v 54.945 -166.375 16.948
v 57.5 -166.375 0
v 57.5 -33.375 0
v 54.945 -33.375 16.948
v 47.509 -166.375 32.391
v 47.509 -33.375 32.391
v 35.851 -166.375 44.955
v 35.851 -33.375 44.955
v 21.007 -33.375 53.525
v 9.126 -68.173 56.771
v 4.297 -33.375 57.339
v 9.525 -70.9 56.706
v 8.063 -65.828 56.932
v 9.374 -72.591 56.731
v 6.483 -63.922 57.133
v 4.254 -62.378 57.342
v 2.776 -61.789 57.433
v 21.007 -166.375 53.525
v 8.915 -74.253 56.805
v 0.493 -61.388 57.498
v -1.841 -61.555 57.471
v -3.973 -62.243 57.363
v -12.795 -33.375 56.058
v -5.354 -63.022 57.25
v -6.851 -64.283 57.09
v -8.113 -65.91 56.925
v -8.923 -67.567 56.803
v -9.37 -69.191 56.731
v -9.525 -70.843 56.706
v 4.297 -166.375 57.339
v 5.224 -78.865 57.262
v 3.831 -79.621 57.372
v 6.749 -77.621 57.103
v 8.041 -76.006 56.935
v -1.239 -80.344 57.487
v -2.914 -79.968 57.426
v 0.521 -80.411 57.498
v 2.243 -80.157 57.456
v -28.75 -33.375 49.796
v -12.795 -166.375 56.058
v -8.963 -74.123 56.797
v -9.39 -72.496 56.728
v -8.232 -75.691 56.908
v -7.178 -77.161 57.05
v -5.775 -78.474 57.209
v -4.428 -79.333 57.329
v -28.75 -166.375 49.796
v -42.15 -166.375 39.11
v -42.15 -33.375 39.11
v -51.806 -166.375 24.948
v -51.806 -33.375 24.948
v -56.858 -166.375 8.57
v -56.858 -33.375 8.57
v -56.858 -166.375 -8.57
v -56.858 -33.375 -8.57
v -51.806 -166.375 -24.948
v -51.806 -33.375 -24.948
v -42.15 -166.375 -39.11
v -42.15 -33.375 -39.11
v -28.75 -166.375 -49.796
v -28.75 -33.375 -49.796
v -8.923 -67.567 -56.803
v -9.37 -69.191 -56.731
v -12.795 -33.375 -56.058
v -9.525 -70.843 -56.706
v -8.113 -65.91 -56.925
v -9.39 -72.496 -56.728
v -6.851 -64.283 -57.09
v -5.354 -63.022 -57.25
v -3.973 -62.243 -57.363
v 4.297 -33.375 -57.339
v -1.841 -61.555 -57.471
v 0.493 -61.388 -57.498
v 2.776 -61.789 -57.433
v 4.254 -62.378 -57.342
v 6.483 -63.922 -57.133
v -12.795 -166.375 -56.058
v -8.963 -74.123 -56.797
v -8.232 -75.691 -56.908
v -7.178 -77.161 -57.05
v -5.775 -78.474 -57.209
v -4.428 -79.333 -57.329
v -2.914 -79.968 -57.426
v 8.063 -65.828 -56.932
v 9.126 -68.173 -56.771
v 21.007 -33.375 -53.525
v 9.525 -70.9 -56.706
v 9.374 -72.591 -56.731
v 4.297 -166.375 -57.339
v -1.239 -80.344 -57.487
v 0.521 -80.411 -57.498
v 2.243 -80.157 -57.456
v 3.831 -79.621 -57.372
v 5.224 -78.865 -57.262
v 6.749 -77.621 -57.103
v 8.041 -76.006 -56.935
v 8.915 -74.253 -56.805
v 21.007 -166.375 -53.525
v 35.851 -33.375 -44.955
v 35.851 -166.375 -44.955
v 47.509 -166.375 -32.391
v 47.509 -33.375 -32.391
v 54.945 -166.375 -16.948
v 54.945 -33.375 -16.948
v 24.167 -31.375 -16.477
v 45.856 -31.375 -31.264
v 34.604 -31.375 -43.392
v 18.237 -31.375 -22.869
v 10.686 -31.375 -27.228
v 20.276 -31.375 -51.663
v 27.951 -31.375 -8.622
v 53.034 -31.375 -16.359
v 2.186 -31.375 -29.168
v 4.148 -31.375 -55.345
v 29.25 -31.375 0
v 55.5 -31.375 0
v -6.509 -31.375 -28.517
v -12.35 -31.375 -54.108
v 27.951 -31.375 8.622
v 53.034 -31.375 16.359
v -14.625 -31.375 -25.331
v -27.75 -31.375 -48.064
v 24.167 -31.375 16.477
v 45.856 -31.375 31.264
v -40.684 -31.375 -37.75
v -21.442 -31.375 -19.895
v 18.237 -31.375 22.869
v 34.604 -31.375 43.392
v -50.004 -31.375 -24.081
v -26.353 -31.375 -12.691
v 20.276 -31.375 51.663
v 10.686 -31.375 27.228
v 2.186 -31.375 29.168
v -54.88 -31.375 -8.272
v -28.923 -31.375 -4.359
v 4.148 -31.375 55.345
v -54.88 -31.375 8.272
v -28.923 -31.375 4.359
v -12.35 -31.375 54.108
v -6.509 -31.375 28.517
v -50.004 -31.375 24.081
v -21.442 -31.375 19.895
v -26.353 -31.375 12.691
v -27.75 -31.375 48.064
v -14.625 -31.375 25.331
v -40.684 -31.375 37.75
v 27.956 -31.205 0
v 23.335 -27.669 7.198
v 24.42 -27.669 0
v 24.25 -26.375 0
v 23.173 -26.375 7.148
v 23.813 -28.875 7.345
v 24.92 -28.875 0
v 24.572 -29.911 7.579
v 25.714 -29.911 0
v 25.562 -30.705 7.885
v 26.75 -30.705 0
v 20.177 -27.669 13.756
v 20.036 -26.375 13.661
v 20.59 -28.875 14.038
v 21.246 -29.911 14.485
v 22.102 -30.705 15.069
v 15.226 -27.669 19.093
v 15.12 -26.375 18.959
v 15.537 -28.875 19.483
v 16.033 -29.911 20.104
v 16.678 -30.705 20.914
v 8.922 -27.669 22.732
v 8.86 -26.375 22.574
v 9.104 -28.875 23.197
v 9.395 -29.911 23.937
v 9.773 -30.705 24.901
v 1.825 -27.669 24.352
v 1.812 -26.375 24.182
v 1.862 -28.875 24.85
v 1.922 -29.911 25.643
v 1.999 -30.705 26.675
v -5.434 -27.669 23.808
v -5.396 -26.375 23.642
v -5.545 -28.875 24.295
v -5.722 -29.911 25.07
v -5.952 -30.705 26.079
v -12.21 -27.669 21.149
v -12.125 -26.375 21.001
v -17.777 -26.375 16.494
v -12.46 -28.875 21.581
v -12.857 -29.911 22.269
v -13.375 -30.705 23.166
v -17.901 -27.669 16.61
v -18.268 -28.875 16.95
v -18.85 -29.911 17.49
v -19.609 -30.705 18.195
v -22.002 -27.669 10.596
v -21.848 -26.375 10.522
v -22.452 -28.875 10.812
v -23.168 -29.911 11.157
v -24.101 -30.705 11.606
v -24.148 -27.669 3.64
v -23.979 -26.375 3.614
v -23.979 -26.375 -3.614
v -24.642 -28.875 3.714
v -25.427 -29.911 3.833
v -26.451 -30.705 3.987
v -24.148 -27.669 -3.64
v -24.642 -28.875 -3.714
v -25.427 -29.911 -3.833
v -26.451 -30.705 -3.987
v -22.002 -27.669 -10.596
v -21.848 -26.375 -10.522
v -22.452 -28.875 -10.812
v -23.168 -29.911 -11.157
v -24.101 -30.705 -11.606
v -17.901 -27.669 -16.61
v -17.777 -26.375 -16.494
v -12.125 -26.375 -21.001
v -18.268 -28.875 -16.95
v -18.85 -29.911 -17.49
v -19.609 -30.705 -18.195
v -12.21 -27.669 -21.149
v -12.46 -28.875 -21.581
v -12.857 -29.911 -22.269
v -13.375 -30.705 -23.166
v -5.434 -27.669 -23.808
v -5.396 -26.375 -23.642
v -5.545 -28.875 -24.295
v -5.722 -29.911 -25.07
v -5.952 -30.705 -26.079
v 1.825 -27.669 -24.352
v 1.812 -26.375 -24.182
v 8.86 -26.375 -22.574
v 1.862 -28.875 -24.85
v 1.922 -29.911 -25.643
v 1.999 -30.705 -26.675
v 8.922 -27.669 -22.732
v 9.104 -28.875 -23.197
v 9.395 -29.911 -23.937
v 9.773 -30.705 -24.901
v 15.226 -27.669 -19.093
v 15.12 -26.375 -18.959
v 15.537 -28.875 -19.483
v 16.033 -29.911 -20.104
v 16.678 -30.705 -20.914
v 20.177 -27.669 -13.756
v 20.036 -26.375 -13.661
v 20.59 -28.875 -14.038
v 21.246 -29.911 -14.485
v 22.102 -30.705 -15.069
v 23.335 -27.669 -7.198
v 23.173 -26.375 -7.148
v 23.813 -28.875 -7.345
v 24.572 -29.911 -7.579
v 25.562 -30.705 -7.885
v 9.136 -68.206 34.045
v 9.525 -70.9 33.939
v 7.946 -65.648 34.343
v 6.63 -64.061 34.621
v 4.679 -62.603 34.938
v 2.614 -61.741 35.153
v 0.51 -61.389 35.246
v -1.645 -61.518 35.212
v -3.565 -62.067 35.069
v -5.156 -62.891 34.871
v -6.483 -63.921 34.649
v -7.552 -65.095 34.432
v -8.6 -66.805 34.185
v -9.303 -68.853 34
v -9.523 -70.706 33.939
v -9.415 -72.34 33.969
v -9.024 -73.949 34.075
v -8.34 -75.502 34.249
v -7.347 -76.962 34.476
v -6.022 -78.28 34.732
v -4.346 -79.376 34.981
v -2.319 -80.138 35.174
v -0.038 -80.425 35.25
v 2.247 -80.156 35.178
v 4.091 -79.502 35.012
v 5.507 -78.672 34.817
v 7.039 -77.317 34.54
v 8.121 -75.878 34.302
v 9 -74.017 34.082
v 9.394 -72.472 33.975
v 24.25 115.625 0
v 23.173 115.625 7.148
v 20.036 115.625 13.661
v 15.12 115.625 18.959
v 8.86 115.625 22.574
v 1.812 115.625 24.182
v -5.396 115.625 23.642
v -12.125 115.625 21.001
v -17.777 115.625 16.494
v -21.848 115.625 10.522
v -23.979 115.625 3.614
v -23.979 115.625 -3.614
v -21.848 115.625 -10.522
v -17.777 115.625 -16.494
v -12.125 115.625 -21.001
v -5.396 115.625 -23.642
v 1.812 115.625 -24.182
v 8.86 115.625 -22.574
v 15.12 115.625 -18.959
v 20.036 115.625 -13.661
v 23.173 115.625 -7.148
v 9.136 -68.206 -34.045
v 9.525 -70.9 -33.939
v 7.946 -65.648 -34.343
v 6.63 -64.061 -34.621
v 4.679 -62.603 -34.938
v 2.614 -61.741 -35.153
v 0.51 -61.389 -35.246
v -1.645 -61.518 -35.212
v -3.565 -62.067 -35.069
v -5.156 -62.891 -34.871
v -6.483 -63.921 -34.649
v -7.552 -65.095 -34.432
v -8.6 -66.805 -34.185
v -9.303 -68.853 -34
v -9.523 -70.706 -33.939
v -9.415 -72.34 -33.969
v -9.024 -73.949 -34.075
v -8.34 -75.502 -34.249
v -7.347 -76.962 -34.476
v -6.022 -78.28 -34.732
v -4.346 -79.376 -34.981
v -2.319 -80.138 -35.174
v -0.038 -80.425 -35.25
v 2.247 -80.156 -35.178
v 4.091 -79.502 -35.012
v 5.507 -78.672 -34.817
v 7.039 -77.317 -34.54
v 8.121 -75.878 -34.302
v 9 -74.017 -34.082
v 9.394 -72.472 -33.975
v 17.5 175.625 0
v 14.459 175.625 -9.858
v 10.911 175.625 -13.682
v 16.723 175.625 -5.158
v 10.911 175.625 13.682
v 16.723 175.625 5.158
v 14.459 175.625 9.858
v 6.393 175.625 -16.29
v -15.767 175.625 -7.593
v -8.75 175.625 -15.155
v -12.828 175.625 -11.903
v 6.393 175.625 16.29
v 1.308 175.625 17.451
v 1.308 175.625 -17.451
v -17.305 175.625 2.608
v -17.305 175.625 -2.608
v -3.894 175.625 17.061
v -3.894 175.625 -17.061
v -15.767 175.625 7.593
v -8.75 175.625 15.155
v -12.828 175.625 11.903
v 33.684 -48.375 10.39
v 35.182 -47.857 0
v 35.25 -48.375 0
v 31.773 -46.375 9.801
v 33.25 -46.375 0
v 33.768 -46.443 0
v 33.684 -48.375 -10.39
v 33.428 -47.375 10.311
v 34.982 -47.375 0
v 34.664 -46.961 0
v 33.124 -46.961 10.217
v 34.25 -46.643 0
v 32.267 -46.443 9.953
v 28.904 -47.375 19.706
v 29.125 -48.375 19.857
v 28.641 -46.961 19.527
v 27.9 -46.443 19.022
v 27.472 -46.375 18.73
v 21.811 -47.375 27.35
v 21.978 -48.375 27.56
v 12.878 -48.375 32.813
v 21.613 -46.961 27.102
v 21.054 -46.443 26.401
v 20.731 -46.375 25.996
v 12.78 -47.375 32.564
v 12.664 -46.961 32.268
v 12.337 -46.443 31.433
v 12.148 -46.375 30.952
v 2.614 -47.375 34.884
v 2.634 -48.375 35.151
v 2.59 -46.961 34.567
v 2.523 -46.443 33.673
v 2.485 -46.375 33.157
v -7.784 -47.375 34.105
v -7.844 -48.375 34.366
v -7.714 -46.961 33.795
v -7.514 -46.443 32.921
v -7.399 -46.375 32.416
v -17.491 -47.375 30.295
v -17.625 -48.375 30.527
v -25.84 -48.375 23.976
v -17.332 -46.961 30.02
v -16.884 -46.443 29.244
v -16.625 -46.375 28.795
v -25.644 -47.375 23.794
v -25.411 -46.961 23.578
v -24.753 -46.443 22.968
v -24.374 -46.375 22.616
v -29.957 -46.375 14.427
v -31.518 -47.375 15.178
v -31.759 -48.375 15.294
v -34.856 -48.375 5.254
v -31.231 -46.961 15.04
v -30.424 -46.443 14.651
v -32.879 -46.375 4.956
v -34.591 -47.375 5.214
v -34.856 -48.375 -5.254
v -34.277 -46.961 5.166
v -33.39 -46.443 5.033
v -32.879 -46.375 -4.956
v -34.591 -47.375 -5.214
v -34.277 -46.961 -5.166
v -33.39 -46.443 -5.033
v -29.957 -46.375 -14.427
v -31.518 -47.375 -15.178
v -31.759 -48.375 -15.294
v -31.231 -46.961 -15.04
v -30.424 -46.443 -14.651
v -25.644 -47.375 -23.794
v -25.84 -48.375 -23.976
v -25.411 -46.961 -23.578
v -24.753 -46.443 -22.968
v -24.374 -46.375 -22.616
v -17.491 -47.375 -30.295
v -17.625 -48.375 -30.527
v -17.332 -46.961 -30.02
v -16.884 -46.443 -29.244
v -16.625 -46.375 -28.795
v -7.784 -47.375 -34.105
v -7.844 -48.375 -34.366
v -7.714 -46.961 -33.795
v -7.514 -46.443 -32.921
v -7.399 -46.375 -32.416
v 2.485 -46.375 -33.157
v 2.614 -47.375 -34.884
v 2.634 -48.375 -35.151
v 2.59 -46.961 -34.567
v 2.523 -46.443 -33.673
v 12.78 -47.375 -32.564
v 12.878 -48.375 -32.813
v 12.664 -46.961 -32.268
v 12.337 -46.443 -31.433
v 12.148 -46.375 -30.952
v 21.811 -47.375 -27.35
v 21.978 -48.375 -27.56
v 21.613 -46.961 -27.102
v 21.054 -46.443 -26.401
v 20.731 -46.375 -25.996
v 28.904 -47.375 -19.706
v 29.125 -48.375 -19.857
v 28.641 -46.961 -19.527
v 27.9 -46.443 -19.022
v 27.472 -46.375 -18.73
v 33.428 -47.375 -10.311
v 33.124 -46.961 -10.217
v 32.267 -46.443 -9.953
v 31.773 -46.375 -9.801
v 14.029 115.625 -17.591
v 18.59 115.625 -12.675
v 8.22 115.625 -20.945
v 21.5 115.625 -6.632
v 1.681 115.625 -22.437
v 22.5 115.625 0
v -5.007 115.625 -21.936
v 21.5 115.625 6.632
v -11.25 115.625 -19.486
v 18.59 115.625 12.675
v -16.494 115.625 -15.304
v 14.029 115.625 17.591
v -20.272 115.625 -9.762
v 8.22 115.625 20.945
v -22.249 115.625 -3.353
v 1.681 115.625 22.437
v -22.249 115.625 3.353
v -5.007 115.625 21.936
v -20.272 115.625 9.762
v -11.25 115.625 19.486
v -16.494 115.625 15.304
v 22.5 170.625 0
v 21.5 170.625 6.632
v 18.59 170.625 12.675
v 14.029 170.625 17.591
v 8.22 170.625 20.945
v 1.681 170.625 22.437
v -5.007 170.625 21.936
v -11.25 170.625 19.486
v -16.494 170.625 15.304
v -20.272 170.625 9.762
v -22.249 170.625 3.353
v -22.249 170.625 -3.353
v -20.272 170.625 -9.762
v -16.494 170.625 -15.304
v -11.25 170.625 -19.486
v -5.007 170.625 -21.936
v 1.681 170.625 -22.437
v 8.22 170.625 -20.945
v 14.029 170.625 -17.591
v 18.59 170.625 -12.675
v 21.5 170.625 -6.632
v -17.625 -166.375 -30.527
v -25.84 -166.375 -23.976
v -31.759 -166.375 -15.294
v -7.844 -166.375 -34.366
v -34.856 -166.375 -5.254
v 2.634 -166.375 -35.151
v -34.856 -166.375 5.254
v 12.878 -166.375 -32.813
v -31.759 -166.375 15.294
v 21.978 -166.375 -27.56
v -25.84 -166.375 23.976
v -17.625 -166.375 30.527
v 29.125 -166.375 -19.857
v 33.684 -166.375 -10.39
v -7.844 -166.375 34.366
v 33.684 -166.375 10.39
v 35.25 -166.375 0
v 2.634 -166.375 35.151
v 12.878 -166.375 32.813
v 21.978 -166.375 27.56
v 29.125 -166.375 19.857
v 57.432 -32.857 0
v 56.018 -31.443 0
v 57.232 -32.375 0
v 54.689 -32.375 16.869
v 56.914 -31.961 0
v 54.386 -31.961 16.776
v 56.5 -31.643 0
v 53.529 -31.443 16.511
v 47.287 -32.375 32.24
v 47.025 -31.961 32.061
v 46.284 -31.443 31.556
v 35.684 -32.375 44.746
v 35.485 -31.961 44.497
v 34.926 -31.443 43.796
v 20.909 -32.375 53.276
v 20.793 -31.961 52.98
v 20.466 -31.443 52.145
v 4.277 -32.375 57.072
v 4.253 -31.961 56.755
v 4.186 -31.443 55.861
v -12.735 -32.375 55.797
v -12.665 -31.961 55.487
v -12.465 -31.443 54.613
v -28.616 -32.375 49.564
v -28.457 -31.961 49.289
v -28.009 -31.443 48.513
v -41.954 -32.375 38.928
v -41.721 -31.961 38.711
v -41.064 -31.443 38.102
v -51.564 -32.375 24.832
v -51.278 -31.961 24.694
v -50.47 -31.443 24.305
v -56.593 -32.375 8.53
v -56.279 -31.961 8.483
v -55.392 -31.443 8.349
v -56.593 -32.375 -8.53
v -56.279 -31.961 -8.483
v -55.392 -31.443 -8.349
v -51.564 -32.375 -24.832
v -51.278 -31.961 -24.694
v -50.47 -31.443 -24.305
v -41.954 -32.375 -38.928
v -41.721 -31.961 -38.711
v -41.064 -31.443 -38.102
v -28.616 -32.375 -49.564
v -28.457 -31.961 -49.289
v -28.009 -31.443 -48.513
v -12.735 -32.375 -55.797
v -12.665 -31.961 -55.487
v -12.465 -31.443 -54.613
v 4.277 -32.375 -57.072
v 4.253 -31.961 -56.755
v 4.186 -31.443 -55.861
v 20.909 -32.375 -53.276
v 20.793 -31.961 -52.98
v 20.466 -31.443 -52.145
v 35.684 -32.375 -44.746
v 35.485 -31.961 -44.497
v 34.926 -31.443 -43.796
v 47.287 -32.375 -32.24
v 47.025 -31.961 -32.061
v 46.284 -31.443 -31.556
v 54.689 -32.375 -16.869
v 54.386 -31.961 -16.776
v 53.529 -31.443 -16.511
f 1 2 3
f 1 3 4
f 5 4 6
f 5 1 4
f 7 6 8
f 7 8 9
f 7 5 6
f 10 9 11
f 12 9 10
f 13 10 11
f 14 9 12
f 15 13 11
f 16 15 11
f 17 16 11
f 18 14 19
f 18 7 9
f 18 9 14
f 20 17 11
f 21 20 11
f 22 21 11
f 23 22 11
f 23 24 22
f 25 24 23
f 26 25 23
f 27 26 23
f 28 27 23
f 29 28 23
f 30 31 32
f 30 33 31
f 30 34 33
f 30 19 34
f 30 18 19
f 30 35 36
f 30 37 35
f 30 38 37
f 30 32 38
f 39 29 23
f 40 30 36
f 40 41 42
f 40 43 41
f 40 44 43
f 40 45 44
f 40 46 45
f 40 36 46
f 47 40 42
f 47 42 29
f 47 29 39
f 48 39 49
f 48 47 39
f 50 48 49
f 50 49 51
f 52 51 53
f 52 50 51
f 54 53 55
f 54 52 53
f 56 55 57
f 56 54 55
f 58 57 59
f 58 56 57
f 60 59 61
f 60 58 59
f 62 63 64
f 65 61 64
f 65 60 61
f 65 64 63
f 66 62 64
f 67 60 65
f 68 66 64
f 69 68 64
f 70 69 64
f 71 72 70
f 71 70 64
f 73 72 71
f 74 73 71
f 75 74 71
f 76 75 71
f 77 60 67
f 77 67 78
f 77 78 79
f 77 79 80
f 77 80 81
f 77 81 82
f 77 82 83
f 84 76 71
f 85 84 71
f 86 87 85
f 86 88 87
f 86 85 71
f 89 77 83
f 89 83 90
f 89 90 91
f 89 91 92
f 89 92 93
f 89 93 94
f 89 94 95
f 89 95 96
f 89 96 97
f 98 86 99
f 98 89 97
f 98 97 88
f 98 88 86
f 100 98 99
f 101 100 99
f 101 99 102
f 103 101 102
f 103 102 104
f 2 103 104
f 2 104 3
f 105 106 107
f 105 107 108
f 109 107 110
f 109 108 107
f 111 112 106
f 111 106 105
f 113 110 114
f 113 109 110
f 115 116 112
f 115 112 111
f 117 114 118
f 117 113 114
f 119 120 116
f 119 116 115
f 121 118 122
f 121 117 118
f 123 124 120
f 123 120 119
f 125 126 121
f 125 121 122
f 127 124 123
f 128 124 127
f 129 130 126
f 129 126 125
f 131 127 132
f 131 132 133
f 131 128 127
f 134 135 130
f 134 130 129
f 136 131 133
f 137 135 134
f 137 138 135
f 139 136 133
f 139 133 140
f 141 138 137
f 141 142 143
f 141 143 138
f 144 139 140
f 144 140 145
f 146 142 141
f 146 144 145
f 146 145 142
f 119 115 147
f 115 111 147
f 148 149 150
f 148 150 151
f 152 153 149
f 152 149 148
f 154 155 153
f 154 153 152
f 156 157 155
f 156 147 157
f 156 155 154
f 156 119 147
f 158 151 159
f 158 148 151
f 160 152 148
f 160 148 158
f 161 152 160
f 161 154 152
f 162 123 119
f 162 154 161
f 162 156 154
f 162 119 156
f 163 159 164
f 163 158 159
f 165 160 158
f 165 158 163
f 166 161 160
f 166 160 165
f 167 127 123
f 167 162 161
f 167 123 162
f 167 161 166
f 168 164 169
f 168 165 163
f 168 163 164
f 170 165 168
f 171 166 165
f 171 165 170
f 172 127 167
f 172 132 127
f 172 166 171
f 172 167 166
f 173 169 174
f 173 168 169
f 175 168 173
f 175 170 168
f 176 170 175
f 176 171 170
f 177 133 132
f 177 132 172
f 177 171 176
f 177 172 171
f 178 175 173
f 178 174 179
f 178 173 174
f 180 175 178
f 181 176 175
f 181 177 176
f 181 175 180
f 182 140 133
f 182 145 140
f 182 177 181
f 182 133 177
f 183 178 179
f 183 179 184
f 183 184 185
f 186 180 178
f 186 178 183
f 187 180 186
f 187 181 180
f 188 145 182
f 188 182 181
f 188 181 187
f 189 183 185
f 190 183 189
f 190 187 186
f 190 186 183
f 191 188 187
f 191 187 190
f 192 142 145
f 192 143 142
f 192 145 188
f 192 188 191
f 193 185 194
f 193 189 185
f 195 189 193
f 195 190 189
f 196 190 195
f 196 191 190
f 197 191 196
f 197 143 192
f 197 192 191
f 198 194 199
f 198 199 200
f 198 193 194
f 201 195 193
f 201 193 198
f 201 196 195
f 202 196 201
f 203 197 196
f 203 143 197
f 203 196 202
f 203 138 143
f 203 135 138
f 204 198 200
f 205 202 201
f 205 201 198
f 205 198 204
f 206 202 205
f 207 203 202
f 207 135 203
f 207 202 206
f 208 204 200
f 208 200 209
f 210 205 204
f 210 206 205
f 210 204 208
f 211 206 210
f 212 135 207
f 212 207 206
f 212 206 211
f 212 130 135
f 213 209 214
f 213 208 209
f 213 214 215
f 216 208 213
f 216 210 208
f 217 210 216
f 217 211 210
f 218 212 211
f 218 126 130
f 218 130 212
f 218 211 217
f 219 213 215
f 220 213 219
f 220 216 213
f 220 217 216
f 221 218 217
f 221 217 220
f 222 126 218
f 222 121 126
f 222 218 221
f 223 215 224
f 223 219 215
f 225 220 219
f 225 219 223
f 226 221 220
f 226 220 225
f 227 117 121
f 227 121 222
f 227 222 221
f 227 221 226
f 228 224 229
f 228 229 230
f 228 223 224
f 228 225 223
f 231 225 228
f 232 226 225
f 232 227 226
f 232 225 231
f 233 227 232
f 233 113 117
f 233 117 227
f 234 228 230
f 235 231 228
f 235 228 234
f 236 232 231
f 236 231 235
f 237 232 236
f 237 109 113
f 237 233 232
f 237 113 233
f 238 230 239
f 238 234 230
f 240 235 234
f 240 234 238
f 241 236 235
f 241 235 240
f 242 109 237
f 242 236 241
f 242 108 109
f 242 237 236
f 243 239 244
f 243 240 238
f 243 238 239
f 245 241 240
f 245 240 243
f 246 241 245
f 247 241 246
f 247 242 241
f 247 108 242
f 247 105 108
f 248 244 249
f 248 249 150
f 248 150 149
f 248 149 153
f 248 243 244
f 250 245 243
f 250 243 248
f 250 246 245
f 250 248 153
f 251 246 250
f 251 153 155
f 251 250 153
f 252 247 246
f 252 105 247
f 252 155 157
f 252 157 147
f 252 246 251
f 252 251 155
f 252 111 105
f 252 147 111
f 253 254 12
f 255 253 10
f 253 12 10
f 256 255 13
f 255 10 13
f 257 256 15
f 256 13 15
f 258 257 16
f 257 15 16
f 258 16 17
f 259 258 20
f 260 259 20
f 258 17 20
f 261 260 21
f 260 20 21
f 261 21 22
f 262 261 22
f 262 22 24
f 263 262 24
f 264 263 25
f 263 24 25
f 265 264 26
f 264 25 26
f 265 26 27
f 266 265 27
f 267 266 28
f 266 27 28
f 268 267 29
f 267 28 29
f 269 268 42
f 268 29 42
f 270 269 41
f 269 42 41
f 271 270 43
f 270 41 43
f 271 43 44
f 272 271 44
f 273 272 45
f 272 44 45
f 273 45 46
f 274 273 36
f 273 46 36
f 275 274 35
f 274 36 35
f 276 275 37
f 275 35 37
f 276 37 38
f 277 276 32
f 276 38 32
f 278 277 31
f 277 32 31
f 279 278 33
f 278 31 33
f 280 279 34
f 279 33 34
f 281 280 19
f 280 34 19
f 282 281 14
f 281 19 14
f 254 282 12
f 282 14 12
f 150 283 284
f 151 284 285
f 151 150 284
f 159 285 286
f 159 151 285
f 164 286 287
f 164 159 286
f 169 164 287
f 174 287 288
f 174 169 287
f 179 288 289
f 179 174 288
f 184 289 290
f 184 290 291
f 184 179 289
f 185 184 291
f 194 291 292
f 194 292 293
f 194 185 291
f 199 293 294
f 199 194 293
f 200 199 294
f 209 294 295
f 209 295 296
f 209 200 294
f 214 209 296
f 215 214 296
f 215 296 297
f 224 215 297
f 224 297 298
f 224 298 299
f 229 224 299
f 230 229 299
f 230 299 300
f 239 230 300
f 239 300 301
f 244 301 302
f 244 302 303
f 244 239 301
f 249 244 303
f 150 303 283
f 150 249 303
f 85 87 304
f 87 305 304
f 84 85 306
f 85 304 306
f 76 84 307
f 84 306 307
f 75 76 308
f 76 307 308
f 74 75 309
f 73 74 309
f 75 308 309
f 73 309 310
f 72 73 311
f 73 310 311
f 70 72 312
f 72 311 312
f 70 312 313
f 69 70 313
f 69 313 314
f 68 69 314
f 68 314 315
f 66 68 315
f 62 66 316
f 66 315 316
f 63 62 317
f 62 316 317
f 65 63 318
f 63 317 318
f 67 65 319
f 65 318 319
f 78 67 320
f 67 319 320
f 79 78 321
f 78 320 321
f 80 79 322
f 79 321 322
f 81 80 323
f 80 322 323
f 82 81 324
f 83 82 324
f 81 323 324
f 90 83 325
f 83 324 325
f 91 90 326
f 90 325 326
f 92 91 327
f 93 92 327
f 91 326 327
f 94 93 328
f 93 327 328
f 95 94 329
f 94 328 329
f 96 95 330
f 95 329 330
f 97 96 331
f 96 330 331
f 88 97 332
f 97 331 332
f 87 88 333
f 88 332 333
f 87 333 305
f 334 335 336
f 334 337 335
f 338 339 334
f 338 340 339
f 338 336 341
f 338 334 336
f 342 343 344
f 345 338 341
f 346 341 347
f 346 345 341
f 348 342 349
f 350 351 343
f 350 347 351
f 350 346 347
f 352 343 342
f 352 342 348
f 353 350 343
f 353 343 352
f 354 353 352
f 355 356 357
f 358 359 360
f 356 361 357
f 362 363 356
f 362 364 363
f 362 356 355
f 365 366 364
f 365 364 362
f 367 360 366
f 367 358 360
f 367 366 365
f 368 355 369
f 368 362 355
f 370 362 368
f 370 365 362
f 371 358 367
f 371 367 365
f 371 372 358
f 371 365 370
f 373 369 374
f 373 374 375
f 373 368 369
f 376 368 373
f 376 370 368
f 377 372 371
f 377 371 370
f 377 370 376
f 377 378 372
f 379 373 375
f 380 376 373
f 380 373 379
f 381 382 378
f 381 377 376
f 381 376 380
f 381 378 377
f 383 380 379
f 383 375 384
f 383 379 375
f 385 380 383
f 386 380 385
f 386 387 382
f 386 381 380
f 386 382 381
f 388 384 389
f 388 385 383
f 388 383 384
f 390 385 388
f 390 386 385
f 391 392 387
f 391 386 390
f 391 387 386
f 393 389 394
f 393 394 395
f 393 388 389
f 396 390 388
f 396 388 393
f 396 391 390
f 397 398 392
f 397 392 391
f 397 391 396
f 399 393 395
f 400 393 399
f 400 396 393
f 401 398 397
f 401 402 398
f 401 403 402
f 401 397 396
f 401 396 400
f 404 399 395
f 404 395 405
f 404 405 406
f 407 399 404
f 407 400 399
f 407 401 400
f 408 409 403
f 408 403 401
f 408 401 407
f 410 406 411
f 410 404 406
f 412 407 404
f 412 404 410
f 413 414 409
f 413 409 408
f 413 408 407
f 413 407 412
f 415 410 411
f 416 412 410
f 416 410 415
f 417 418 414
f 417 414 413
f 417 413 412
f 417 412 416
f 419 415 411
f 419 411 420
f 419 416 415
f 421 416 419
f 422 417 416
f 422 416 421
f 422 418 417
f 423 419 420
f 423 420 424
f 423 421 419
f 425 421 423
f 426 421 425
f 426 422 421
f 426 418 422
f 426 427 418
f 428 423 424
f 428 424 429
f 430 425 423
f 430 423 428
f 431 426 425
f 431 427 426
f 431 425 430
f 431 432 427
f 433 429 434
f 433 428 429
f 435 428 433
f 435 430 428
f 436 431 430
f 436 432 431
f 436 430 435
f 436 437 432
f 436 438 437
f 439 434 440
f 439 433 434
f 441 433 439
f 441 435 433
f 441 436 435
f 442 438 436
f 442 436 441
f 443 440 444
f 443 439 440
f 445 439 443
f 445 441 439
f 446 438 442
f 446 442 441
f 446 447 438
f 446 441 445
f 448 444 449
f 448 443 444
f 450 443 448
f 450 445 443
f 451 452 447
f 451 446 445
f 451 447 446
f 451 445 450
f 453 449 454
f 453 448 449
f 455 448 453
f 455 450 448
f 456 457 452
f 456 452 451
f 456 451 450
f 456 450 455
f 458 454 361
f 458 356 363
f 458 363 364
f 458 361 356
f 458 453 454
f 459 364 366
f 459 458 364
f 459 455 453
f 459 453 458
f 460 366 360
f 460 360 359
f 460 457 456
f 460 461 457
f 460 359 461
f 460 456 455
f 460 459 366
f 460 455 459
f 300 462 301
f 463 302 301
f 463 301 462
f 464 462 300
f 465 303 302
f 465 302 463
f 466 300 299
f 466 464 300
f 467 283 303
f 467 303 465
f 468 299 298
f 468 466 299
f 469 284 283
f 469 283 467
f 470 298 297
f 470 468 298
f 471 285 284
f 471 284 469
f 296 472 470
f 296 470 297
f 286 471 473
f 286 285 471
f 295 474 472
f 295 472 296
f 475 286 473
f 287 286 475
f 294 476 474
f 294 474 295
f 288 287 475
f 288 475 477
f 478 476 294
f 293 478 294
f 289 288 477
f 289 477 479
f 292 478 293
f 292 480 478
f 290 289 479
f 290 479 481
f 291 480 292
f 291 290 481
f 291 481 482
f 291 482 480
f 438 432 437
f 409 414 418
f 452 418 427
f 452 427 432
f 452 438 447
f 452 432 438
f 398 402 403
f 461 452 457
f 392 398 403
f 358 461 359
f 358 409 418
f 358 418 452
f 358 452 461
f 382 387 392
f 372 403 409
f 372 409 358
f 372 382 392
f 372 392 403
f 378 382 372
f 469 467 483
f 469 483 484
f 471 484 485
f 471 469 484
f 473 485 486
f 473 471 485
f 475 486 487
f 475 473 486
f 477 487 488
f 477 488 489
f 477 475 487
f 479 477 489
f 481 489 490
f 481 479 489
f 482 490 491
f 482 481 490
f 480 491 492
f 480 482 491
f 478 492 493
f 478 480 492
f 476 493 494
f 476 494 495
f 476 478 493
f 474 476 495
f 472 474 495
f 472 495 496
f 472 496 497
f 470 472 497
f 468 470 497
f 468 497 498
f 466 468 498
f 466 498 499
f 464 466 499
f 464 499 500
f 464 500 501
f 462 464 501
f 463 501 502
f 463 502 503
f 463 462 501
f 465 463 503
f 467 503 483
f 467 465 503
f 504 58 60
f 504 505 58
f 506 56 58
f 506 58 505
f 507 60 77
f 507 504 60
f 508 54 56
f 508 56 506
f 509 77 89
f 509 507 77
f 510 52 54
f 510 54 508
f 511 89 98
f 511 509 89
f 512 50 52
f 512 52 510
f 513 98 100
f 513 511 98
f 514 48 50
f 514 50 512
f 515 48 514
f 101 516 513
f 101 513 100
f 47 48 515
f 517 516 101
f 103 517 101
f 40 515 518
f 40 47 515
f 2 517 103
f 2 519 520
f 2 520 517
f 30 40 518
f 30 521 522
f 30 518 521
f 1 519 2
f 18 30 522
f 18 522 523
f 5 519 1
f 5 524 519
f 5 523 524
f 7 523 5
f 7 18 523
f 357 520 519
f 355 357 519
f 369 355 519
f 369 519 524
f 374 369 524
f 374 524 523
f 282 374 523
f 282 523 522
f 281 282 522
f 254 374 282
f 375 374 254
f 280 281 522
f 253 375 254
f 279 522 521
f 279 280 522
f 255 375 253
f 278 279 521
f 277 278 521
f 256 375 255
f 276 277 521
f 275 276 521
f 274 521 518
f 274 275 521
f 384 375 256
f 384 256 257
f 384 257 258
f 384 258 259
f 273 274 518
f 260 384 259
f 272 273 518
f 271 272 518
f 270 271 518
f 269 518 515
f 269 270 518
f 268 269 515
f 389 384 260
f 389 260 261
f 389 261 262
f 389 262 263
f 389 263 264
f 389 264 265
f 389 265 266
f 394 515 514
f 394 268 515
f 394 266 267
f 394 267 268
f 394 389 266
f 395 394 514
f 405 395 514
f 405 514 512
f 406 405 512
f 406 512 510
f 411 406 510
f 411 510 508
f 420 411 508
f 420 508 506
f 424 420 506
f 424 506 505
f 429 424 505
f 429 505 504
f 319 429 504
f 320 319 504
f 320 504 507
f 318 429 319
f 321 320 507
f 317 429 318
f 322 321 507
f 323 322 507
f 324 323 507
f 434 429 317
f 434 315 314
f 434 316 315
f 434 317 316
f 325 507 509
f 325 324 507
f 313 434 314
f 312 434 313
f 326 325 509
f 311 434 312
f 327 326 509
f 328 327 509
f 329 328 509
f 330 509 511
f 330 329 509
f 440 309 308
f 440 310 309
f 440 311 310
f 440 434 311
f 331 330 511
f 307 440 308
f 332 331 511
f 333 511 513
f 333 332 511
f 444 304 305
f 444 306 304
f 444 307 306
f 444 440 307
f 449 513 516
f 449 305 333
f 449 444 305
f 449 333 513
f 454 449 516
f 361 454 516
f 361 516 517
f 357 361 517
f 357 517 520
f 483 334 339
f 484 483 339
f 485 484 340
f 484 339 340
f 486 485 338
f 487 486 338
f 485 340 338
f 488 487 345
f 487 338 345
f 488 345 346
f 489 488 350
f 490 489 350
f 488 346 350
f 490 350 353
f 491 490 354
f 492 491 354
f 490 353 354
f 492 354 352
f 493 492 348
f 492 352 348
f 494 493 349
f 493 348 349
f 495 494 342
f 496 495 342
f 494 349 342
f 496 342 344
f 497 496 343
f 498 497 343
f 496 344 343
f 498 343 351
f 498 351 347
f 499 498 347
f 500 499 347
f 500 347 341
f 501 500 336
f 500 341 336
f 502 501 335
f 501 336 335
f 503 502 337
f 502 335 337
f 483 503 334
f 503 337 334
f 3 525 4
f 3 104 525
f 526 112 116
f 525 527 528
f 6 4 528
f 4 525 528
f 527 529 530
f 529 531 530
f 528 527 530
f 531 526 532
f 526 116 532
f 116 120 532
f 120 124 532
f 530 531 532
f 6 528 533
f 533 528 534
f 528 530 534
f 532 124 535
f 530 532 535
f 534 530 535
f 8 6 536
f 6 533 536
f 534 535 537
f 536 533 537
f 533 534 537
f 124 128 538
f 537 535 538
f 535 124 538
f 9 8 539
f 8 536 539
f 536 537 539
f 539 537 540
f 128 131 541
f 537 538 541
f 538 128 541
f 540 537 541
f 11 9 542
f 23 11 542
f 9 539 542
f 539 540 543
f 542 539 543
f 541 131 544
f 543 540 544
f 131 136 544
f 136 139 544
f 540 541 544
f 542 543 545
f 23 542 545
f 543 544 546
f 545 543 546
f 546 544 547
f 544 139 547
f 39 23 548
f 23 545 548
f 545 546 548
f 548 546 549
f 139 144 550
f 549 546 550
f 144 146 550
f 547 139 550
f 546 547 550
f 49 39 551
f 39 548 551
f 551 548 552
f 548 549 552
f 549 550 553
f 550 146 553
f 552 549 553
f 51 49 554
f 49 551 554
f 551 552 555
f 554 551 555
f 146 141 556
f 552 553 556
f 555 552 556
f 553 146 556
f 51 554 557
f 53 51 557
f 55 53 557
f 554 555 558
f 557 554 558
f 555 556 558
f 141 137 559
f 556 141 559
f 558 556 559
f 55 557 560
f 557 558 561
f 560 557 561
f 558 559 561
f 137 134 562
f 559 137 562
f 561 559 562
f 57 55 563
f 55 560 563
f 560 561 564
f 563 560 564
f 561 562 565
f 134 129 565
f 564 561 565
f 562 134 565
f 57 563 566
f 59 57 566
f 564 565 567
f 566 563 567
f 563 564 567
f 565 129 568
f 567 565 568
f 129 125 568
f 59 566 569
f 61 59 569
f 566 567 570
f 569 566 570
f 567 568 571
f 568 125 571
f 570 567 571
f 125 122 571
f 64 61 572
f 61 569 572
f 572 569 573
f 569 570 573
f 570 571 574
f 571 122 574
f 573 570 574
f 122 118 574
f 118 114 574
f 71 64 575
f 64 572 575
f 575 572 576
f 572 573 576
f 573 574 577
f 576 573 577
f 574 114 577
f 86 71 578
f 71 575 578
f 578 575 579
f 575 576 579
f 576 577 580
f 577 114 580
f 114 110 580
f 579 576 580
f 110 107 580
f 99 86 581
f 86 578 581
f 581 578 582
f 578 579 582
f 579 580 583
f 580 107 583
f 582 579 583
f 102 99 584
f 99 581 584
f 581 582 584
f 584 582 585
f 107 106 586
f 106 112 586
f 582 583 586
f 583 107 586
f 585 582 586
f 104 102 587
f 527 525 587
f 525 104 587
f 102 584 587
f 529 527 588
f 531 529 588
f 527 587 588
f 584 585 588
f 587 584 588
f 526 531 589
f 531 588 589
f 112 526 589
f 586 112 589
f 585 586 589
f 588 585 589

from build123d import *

# Parameters (mm, degrees)
REDONDEO1_R           = 5
REDONDEO2_R           = 2
CROQUIS2_R            = 9.525
CORTAR_EXTRUIR1_DEPTH = 60
REDONDEO3_R           = 2
CHAFL_N1_SIZE         = 5


with BuildPart() as part:
    # Croquis1 → Revolución2 (revolve)
    with BuildSketch(Plane.XY):
        Polygon((0, 175.625), (22.5, 175.625), (22.5, 115.625), (24.25, 115.625), (24.25, -31.375), (57.5, -31.375), (57.5, -166.375), (35.25, -166.375), (35.25, -46.375), (0, -46.375), align=None)
    revolve(axis=Axis((0, 96.1875, 0), (0, -1, 0)))

    # Redondeo1
    redondeo1_edges = [part.edges().sort_by_distance(p)[0] for p in [
        (-24.25, -31.375, 0),
    ]]
    fillet(redondeo1_edges, radius=REDONDEO1_R)

    # Redondeo2
    redondeo2_edges = [part.edges().sort_by_distance(p)[0] for p in [
        (-35.25, -46.375, 0),
    ]]
    fillet(redondeo2_edges, radius=REDONDEO2_R)

    # Croquis2 → Cortar-Extruir1 (cut, symmetric)
    with BuildSketch(Plane.XY):
        with Locations((0, -70.9)):
            Circle(CROQUIS2_R)
    extrude(amount=CORTAR_EXTRUIR1_DEPTH, both=True, mode=Mode.SUBTRACT)

    # Redondeo3
    redondeo3_edges = [part.edges().sort_by_distance(p)[0] for p in [
        (-57.5, -31.375, 0),
    ]]
    fillet(redondeo3_edges, radius=REDONDEO3_R)

    # Chaflán1
    chafl_n1_edges = [part.edges().sort_by_distance(p)[0] for p in [
        (-22.5, 175.625, 0),
    ]]
    chamfer(chafl_n1_edges, length=CHAFL_N1_SIZE)


solid = part.part
